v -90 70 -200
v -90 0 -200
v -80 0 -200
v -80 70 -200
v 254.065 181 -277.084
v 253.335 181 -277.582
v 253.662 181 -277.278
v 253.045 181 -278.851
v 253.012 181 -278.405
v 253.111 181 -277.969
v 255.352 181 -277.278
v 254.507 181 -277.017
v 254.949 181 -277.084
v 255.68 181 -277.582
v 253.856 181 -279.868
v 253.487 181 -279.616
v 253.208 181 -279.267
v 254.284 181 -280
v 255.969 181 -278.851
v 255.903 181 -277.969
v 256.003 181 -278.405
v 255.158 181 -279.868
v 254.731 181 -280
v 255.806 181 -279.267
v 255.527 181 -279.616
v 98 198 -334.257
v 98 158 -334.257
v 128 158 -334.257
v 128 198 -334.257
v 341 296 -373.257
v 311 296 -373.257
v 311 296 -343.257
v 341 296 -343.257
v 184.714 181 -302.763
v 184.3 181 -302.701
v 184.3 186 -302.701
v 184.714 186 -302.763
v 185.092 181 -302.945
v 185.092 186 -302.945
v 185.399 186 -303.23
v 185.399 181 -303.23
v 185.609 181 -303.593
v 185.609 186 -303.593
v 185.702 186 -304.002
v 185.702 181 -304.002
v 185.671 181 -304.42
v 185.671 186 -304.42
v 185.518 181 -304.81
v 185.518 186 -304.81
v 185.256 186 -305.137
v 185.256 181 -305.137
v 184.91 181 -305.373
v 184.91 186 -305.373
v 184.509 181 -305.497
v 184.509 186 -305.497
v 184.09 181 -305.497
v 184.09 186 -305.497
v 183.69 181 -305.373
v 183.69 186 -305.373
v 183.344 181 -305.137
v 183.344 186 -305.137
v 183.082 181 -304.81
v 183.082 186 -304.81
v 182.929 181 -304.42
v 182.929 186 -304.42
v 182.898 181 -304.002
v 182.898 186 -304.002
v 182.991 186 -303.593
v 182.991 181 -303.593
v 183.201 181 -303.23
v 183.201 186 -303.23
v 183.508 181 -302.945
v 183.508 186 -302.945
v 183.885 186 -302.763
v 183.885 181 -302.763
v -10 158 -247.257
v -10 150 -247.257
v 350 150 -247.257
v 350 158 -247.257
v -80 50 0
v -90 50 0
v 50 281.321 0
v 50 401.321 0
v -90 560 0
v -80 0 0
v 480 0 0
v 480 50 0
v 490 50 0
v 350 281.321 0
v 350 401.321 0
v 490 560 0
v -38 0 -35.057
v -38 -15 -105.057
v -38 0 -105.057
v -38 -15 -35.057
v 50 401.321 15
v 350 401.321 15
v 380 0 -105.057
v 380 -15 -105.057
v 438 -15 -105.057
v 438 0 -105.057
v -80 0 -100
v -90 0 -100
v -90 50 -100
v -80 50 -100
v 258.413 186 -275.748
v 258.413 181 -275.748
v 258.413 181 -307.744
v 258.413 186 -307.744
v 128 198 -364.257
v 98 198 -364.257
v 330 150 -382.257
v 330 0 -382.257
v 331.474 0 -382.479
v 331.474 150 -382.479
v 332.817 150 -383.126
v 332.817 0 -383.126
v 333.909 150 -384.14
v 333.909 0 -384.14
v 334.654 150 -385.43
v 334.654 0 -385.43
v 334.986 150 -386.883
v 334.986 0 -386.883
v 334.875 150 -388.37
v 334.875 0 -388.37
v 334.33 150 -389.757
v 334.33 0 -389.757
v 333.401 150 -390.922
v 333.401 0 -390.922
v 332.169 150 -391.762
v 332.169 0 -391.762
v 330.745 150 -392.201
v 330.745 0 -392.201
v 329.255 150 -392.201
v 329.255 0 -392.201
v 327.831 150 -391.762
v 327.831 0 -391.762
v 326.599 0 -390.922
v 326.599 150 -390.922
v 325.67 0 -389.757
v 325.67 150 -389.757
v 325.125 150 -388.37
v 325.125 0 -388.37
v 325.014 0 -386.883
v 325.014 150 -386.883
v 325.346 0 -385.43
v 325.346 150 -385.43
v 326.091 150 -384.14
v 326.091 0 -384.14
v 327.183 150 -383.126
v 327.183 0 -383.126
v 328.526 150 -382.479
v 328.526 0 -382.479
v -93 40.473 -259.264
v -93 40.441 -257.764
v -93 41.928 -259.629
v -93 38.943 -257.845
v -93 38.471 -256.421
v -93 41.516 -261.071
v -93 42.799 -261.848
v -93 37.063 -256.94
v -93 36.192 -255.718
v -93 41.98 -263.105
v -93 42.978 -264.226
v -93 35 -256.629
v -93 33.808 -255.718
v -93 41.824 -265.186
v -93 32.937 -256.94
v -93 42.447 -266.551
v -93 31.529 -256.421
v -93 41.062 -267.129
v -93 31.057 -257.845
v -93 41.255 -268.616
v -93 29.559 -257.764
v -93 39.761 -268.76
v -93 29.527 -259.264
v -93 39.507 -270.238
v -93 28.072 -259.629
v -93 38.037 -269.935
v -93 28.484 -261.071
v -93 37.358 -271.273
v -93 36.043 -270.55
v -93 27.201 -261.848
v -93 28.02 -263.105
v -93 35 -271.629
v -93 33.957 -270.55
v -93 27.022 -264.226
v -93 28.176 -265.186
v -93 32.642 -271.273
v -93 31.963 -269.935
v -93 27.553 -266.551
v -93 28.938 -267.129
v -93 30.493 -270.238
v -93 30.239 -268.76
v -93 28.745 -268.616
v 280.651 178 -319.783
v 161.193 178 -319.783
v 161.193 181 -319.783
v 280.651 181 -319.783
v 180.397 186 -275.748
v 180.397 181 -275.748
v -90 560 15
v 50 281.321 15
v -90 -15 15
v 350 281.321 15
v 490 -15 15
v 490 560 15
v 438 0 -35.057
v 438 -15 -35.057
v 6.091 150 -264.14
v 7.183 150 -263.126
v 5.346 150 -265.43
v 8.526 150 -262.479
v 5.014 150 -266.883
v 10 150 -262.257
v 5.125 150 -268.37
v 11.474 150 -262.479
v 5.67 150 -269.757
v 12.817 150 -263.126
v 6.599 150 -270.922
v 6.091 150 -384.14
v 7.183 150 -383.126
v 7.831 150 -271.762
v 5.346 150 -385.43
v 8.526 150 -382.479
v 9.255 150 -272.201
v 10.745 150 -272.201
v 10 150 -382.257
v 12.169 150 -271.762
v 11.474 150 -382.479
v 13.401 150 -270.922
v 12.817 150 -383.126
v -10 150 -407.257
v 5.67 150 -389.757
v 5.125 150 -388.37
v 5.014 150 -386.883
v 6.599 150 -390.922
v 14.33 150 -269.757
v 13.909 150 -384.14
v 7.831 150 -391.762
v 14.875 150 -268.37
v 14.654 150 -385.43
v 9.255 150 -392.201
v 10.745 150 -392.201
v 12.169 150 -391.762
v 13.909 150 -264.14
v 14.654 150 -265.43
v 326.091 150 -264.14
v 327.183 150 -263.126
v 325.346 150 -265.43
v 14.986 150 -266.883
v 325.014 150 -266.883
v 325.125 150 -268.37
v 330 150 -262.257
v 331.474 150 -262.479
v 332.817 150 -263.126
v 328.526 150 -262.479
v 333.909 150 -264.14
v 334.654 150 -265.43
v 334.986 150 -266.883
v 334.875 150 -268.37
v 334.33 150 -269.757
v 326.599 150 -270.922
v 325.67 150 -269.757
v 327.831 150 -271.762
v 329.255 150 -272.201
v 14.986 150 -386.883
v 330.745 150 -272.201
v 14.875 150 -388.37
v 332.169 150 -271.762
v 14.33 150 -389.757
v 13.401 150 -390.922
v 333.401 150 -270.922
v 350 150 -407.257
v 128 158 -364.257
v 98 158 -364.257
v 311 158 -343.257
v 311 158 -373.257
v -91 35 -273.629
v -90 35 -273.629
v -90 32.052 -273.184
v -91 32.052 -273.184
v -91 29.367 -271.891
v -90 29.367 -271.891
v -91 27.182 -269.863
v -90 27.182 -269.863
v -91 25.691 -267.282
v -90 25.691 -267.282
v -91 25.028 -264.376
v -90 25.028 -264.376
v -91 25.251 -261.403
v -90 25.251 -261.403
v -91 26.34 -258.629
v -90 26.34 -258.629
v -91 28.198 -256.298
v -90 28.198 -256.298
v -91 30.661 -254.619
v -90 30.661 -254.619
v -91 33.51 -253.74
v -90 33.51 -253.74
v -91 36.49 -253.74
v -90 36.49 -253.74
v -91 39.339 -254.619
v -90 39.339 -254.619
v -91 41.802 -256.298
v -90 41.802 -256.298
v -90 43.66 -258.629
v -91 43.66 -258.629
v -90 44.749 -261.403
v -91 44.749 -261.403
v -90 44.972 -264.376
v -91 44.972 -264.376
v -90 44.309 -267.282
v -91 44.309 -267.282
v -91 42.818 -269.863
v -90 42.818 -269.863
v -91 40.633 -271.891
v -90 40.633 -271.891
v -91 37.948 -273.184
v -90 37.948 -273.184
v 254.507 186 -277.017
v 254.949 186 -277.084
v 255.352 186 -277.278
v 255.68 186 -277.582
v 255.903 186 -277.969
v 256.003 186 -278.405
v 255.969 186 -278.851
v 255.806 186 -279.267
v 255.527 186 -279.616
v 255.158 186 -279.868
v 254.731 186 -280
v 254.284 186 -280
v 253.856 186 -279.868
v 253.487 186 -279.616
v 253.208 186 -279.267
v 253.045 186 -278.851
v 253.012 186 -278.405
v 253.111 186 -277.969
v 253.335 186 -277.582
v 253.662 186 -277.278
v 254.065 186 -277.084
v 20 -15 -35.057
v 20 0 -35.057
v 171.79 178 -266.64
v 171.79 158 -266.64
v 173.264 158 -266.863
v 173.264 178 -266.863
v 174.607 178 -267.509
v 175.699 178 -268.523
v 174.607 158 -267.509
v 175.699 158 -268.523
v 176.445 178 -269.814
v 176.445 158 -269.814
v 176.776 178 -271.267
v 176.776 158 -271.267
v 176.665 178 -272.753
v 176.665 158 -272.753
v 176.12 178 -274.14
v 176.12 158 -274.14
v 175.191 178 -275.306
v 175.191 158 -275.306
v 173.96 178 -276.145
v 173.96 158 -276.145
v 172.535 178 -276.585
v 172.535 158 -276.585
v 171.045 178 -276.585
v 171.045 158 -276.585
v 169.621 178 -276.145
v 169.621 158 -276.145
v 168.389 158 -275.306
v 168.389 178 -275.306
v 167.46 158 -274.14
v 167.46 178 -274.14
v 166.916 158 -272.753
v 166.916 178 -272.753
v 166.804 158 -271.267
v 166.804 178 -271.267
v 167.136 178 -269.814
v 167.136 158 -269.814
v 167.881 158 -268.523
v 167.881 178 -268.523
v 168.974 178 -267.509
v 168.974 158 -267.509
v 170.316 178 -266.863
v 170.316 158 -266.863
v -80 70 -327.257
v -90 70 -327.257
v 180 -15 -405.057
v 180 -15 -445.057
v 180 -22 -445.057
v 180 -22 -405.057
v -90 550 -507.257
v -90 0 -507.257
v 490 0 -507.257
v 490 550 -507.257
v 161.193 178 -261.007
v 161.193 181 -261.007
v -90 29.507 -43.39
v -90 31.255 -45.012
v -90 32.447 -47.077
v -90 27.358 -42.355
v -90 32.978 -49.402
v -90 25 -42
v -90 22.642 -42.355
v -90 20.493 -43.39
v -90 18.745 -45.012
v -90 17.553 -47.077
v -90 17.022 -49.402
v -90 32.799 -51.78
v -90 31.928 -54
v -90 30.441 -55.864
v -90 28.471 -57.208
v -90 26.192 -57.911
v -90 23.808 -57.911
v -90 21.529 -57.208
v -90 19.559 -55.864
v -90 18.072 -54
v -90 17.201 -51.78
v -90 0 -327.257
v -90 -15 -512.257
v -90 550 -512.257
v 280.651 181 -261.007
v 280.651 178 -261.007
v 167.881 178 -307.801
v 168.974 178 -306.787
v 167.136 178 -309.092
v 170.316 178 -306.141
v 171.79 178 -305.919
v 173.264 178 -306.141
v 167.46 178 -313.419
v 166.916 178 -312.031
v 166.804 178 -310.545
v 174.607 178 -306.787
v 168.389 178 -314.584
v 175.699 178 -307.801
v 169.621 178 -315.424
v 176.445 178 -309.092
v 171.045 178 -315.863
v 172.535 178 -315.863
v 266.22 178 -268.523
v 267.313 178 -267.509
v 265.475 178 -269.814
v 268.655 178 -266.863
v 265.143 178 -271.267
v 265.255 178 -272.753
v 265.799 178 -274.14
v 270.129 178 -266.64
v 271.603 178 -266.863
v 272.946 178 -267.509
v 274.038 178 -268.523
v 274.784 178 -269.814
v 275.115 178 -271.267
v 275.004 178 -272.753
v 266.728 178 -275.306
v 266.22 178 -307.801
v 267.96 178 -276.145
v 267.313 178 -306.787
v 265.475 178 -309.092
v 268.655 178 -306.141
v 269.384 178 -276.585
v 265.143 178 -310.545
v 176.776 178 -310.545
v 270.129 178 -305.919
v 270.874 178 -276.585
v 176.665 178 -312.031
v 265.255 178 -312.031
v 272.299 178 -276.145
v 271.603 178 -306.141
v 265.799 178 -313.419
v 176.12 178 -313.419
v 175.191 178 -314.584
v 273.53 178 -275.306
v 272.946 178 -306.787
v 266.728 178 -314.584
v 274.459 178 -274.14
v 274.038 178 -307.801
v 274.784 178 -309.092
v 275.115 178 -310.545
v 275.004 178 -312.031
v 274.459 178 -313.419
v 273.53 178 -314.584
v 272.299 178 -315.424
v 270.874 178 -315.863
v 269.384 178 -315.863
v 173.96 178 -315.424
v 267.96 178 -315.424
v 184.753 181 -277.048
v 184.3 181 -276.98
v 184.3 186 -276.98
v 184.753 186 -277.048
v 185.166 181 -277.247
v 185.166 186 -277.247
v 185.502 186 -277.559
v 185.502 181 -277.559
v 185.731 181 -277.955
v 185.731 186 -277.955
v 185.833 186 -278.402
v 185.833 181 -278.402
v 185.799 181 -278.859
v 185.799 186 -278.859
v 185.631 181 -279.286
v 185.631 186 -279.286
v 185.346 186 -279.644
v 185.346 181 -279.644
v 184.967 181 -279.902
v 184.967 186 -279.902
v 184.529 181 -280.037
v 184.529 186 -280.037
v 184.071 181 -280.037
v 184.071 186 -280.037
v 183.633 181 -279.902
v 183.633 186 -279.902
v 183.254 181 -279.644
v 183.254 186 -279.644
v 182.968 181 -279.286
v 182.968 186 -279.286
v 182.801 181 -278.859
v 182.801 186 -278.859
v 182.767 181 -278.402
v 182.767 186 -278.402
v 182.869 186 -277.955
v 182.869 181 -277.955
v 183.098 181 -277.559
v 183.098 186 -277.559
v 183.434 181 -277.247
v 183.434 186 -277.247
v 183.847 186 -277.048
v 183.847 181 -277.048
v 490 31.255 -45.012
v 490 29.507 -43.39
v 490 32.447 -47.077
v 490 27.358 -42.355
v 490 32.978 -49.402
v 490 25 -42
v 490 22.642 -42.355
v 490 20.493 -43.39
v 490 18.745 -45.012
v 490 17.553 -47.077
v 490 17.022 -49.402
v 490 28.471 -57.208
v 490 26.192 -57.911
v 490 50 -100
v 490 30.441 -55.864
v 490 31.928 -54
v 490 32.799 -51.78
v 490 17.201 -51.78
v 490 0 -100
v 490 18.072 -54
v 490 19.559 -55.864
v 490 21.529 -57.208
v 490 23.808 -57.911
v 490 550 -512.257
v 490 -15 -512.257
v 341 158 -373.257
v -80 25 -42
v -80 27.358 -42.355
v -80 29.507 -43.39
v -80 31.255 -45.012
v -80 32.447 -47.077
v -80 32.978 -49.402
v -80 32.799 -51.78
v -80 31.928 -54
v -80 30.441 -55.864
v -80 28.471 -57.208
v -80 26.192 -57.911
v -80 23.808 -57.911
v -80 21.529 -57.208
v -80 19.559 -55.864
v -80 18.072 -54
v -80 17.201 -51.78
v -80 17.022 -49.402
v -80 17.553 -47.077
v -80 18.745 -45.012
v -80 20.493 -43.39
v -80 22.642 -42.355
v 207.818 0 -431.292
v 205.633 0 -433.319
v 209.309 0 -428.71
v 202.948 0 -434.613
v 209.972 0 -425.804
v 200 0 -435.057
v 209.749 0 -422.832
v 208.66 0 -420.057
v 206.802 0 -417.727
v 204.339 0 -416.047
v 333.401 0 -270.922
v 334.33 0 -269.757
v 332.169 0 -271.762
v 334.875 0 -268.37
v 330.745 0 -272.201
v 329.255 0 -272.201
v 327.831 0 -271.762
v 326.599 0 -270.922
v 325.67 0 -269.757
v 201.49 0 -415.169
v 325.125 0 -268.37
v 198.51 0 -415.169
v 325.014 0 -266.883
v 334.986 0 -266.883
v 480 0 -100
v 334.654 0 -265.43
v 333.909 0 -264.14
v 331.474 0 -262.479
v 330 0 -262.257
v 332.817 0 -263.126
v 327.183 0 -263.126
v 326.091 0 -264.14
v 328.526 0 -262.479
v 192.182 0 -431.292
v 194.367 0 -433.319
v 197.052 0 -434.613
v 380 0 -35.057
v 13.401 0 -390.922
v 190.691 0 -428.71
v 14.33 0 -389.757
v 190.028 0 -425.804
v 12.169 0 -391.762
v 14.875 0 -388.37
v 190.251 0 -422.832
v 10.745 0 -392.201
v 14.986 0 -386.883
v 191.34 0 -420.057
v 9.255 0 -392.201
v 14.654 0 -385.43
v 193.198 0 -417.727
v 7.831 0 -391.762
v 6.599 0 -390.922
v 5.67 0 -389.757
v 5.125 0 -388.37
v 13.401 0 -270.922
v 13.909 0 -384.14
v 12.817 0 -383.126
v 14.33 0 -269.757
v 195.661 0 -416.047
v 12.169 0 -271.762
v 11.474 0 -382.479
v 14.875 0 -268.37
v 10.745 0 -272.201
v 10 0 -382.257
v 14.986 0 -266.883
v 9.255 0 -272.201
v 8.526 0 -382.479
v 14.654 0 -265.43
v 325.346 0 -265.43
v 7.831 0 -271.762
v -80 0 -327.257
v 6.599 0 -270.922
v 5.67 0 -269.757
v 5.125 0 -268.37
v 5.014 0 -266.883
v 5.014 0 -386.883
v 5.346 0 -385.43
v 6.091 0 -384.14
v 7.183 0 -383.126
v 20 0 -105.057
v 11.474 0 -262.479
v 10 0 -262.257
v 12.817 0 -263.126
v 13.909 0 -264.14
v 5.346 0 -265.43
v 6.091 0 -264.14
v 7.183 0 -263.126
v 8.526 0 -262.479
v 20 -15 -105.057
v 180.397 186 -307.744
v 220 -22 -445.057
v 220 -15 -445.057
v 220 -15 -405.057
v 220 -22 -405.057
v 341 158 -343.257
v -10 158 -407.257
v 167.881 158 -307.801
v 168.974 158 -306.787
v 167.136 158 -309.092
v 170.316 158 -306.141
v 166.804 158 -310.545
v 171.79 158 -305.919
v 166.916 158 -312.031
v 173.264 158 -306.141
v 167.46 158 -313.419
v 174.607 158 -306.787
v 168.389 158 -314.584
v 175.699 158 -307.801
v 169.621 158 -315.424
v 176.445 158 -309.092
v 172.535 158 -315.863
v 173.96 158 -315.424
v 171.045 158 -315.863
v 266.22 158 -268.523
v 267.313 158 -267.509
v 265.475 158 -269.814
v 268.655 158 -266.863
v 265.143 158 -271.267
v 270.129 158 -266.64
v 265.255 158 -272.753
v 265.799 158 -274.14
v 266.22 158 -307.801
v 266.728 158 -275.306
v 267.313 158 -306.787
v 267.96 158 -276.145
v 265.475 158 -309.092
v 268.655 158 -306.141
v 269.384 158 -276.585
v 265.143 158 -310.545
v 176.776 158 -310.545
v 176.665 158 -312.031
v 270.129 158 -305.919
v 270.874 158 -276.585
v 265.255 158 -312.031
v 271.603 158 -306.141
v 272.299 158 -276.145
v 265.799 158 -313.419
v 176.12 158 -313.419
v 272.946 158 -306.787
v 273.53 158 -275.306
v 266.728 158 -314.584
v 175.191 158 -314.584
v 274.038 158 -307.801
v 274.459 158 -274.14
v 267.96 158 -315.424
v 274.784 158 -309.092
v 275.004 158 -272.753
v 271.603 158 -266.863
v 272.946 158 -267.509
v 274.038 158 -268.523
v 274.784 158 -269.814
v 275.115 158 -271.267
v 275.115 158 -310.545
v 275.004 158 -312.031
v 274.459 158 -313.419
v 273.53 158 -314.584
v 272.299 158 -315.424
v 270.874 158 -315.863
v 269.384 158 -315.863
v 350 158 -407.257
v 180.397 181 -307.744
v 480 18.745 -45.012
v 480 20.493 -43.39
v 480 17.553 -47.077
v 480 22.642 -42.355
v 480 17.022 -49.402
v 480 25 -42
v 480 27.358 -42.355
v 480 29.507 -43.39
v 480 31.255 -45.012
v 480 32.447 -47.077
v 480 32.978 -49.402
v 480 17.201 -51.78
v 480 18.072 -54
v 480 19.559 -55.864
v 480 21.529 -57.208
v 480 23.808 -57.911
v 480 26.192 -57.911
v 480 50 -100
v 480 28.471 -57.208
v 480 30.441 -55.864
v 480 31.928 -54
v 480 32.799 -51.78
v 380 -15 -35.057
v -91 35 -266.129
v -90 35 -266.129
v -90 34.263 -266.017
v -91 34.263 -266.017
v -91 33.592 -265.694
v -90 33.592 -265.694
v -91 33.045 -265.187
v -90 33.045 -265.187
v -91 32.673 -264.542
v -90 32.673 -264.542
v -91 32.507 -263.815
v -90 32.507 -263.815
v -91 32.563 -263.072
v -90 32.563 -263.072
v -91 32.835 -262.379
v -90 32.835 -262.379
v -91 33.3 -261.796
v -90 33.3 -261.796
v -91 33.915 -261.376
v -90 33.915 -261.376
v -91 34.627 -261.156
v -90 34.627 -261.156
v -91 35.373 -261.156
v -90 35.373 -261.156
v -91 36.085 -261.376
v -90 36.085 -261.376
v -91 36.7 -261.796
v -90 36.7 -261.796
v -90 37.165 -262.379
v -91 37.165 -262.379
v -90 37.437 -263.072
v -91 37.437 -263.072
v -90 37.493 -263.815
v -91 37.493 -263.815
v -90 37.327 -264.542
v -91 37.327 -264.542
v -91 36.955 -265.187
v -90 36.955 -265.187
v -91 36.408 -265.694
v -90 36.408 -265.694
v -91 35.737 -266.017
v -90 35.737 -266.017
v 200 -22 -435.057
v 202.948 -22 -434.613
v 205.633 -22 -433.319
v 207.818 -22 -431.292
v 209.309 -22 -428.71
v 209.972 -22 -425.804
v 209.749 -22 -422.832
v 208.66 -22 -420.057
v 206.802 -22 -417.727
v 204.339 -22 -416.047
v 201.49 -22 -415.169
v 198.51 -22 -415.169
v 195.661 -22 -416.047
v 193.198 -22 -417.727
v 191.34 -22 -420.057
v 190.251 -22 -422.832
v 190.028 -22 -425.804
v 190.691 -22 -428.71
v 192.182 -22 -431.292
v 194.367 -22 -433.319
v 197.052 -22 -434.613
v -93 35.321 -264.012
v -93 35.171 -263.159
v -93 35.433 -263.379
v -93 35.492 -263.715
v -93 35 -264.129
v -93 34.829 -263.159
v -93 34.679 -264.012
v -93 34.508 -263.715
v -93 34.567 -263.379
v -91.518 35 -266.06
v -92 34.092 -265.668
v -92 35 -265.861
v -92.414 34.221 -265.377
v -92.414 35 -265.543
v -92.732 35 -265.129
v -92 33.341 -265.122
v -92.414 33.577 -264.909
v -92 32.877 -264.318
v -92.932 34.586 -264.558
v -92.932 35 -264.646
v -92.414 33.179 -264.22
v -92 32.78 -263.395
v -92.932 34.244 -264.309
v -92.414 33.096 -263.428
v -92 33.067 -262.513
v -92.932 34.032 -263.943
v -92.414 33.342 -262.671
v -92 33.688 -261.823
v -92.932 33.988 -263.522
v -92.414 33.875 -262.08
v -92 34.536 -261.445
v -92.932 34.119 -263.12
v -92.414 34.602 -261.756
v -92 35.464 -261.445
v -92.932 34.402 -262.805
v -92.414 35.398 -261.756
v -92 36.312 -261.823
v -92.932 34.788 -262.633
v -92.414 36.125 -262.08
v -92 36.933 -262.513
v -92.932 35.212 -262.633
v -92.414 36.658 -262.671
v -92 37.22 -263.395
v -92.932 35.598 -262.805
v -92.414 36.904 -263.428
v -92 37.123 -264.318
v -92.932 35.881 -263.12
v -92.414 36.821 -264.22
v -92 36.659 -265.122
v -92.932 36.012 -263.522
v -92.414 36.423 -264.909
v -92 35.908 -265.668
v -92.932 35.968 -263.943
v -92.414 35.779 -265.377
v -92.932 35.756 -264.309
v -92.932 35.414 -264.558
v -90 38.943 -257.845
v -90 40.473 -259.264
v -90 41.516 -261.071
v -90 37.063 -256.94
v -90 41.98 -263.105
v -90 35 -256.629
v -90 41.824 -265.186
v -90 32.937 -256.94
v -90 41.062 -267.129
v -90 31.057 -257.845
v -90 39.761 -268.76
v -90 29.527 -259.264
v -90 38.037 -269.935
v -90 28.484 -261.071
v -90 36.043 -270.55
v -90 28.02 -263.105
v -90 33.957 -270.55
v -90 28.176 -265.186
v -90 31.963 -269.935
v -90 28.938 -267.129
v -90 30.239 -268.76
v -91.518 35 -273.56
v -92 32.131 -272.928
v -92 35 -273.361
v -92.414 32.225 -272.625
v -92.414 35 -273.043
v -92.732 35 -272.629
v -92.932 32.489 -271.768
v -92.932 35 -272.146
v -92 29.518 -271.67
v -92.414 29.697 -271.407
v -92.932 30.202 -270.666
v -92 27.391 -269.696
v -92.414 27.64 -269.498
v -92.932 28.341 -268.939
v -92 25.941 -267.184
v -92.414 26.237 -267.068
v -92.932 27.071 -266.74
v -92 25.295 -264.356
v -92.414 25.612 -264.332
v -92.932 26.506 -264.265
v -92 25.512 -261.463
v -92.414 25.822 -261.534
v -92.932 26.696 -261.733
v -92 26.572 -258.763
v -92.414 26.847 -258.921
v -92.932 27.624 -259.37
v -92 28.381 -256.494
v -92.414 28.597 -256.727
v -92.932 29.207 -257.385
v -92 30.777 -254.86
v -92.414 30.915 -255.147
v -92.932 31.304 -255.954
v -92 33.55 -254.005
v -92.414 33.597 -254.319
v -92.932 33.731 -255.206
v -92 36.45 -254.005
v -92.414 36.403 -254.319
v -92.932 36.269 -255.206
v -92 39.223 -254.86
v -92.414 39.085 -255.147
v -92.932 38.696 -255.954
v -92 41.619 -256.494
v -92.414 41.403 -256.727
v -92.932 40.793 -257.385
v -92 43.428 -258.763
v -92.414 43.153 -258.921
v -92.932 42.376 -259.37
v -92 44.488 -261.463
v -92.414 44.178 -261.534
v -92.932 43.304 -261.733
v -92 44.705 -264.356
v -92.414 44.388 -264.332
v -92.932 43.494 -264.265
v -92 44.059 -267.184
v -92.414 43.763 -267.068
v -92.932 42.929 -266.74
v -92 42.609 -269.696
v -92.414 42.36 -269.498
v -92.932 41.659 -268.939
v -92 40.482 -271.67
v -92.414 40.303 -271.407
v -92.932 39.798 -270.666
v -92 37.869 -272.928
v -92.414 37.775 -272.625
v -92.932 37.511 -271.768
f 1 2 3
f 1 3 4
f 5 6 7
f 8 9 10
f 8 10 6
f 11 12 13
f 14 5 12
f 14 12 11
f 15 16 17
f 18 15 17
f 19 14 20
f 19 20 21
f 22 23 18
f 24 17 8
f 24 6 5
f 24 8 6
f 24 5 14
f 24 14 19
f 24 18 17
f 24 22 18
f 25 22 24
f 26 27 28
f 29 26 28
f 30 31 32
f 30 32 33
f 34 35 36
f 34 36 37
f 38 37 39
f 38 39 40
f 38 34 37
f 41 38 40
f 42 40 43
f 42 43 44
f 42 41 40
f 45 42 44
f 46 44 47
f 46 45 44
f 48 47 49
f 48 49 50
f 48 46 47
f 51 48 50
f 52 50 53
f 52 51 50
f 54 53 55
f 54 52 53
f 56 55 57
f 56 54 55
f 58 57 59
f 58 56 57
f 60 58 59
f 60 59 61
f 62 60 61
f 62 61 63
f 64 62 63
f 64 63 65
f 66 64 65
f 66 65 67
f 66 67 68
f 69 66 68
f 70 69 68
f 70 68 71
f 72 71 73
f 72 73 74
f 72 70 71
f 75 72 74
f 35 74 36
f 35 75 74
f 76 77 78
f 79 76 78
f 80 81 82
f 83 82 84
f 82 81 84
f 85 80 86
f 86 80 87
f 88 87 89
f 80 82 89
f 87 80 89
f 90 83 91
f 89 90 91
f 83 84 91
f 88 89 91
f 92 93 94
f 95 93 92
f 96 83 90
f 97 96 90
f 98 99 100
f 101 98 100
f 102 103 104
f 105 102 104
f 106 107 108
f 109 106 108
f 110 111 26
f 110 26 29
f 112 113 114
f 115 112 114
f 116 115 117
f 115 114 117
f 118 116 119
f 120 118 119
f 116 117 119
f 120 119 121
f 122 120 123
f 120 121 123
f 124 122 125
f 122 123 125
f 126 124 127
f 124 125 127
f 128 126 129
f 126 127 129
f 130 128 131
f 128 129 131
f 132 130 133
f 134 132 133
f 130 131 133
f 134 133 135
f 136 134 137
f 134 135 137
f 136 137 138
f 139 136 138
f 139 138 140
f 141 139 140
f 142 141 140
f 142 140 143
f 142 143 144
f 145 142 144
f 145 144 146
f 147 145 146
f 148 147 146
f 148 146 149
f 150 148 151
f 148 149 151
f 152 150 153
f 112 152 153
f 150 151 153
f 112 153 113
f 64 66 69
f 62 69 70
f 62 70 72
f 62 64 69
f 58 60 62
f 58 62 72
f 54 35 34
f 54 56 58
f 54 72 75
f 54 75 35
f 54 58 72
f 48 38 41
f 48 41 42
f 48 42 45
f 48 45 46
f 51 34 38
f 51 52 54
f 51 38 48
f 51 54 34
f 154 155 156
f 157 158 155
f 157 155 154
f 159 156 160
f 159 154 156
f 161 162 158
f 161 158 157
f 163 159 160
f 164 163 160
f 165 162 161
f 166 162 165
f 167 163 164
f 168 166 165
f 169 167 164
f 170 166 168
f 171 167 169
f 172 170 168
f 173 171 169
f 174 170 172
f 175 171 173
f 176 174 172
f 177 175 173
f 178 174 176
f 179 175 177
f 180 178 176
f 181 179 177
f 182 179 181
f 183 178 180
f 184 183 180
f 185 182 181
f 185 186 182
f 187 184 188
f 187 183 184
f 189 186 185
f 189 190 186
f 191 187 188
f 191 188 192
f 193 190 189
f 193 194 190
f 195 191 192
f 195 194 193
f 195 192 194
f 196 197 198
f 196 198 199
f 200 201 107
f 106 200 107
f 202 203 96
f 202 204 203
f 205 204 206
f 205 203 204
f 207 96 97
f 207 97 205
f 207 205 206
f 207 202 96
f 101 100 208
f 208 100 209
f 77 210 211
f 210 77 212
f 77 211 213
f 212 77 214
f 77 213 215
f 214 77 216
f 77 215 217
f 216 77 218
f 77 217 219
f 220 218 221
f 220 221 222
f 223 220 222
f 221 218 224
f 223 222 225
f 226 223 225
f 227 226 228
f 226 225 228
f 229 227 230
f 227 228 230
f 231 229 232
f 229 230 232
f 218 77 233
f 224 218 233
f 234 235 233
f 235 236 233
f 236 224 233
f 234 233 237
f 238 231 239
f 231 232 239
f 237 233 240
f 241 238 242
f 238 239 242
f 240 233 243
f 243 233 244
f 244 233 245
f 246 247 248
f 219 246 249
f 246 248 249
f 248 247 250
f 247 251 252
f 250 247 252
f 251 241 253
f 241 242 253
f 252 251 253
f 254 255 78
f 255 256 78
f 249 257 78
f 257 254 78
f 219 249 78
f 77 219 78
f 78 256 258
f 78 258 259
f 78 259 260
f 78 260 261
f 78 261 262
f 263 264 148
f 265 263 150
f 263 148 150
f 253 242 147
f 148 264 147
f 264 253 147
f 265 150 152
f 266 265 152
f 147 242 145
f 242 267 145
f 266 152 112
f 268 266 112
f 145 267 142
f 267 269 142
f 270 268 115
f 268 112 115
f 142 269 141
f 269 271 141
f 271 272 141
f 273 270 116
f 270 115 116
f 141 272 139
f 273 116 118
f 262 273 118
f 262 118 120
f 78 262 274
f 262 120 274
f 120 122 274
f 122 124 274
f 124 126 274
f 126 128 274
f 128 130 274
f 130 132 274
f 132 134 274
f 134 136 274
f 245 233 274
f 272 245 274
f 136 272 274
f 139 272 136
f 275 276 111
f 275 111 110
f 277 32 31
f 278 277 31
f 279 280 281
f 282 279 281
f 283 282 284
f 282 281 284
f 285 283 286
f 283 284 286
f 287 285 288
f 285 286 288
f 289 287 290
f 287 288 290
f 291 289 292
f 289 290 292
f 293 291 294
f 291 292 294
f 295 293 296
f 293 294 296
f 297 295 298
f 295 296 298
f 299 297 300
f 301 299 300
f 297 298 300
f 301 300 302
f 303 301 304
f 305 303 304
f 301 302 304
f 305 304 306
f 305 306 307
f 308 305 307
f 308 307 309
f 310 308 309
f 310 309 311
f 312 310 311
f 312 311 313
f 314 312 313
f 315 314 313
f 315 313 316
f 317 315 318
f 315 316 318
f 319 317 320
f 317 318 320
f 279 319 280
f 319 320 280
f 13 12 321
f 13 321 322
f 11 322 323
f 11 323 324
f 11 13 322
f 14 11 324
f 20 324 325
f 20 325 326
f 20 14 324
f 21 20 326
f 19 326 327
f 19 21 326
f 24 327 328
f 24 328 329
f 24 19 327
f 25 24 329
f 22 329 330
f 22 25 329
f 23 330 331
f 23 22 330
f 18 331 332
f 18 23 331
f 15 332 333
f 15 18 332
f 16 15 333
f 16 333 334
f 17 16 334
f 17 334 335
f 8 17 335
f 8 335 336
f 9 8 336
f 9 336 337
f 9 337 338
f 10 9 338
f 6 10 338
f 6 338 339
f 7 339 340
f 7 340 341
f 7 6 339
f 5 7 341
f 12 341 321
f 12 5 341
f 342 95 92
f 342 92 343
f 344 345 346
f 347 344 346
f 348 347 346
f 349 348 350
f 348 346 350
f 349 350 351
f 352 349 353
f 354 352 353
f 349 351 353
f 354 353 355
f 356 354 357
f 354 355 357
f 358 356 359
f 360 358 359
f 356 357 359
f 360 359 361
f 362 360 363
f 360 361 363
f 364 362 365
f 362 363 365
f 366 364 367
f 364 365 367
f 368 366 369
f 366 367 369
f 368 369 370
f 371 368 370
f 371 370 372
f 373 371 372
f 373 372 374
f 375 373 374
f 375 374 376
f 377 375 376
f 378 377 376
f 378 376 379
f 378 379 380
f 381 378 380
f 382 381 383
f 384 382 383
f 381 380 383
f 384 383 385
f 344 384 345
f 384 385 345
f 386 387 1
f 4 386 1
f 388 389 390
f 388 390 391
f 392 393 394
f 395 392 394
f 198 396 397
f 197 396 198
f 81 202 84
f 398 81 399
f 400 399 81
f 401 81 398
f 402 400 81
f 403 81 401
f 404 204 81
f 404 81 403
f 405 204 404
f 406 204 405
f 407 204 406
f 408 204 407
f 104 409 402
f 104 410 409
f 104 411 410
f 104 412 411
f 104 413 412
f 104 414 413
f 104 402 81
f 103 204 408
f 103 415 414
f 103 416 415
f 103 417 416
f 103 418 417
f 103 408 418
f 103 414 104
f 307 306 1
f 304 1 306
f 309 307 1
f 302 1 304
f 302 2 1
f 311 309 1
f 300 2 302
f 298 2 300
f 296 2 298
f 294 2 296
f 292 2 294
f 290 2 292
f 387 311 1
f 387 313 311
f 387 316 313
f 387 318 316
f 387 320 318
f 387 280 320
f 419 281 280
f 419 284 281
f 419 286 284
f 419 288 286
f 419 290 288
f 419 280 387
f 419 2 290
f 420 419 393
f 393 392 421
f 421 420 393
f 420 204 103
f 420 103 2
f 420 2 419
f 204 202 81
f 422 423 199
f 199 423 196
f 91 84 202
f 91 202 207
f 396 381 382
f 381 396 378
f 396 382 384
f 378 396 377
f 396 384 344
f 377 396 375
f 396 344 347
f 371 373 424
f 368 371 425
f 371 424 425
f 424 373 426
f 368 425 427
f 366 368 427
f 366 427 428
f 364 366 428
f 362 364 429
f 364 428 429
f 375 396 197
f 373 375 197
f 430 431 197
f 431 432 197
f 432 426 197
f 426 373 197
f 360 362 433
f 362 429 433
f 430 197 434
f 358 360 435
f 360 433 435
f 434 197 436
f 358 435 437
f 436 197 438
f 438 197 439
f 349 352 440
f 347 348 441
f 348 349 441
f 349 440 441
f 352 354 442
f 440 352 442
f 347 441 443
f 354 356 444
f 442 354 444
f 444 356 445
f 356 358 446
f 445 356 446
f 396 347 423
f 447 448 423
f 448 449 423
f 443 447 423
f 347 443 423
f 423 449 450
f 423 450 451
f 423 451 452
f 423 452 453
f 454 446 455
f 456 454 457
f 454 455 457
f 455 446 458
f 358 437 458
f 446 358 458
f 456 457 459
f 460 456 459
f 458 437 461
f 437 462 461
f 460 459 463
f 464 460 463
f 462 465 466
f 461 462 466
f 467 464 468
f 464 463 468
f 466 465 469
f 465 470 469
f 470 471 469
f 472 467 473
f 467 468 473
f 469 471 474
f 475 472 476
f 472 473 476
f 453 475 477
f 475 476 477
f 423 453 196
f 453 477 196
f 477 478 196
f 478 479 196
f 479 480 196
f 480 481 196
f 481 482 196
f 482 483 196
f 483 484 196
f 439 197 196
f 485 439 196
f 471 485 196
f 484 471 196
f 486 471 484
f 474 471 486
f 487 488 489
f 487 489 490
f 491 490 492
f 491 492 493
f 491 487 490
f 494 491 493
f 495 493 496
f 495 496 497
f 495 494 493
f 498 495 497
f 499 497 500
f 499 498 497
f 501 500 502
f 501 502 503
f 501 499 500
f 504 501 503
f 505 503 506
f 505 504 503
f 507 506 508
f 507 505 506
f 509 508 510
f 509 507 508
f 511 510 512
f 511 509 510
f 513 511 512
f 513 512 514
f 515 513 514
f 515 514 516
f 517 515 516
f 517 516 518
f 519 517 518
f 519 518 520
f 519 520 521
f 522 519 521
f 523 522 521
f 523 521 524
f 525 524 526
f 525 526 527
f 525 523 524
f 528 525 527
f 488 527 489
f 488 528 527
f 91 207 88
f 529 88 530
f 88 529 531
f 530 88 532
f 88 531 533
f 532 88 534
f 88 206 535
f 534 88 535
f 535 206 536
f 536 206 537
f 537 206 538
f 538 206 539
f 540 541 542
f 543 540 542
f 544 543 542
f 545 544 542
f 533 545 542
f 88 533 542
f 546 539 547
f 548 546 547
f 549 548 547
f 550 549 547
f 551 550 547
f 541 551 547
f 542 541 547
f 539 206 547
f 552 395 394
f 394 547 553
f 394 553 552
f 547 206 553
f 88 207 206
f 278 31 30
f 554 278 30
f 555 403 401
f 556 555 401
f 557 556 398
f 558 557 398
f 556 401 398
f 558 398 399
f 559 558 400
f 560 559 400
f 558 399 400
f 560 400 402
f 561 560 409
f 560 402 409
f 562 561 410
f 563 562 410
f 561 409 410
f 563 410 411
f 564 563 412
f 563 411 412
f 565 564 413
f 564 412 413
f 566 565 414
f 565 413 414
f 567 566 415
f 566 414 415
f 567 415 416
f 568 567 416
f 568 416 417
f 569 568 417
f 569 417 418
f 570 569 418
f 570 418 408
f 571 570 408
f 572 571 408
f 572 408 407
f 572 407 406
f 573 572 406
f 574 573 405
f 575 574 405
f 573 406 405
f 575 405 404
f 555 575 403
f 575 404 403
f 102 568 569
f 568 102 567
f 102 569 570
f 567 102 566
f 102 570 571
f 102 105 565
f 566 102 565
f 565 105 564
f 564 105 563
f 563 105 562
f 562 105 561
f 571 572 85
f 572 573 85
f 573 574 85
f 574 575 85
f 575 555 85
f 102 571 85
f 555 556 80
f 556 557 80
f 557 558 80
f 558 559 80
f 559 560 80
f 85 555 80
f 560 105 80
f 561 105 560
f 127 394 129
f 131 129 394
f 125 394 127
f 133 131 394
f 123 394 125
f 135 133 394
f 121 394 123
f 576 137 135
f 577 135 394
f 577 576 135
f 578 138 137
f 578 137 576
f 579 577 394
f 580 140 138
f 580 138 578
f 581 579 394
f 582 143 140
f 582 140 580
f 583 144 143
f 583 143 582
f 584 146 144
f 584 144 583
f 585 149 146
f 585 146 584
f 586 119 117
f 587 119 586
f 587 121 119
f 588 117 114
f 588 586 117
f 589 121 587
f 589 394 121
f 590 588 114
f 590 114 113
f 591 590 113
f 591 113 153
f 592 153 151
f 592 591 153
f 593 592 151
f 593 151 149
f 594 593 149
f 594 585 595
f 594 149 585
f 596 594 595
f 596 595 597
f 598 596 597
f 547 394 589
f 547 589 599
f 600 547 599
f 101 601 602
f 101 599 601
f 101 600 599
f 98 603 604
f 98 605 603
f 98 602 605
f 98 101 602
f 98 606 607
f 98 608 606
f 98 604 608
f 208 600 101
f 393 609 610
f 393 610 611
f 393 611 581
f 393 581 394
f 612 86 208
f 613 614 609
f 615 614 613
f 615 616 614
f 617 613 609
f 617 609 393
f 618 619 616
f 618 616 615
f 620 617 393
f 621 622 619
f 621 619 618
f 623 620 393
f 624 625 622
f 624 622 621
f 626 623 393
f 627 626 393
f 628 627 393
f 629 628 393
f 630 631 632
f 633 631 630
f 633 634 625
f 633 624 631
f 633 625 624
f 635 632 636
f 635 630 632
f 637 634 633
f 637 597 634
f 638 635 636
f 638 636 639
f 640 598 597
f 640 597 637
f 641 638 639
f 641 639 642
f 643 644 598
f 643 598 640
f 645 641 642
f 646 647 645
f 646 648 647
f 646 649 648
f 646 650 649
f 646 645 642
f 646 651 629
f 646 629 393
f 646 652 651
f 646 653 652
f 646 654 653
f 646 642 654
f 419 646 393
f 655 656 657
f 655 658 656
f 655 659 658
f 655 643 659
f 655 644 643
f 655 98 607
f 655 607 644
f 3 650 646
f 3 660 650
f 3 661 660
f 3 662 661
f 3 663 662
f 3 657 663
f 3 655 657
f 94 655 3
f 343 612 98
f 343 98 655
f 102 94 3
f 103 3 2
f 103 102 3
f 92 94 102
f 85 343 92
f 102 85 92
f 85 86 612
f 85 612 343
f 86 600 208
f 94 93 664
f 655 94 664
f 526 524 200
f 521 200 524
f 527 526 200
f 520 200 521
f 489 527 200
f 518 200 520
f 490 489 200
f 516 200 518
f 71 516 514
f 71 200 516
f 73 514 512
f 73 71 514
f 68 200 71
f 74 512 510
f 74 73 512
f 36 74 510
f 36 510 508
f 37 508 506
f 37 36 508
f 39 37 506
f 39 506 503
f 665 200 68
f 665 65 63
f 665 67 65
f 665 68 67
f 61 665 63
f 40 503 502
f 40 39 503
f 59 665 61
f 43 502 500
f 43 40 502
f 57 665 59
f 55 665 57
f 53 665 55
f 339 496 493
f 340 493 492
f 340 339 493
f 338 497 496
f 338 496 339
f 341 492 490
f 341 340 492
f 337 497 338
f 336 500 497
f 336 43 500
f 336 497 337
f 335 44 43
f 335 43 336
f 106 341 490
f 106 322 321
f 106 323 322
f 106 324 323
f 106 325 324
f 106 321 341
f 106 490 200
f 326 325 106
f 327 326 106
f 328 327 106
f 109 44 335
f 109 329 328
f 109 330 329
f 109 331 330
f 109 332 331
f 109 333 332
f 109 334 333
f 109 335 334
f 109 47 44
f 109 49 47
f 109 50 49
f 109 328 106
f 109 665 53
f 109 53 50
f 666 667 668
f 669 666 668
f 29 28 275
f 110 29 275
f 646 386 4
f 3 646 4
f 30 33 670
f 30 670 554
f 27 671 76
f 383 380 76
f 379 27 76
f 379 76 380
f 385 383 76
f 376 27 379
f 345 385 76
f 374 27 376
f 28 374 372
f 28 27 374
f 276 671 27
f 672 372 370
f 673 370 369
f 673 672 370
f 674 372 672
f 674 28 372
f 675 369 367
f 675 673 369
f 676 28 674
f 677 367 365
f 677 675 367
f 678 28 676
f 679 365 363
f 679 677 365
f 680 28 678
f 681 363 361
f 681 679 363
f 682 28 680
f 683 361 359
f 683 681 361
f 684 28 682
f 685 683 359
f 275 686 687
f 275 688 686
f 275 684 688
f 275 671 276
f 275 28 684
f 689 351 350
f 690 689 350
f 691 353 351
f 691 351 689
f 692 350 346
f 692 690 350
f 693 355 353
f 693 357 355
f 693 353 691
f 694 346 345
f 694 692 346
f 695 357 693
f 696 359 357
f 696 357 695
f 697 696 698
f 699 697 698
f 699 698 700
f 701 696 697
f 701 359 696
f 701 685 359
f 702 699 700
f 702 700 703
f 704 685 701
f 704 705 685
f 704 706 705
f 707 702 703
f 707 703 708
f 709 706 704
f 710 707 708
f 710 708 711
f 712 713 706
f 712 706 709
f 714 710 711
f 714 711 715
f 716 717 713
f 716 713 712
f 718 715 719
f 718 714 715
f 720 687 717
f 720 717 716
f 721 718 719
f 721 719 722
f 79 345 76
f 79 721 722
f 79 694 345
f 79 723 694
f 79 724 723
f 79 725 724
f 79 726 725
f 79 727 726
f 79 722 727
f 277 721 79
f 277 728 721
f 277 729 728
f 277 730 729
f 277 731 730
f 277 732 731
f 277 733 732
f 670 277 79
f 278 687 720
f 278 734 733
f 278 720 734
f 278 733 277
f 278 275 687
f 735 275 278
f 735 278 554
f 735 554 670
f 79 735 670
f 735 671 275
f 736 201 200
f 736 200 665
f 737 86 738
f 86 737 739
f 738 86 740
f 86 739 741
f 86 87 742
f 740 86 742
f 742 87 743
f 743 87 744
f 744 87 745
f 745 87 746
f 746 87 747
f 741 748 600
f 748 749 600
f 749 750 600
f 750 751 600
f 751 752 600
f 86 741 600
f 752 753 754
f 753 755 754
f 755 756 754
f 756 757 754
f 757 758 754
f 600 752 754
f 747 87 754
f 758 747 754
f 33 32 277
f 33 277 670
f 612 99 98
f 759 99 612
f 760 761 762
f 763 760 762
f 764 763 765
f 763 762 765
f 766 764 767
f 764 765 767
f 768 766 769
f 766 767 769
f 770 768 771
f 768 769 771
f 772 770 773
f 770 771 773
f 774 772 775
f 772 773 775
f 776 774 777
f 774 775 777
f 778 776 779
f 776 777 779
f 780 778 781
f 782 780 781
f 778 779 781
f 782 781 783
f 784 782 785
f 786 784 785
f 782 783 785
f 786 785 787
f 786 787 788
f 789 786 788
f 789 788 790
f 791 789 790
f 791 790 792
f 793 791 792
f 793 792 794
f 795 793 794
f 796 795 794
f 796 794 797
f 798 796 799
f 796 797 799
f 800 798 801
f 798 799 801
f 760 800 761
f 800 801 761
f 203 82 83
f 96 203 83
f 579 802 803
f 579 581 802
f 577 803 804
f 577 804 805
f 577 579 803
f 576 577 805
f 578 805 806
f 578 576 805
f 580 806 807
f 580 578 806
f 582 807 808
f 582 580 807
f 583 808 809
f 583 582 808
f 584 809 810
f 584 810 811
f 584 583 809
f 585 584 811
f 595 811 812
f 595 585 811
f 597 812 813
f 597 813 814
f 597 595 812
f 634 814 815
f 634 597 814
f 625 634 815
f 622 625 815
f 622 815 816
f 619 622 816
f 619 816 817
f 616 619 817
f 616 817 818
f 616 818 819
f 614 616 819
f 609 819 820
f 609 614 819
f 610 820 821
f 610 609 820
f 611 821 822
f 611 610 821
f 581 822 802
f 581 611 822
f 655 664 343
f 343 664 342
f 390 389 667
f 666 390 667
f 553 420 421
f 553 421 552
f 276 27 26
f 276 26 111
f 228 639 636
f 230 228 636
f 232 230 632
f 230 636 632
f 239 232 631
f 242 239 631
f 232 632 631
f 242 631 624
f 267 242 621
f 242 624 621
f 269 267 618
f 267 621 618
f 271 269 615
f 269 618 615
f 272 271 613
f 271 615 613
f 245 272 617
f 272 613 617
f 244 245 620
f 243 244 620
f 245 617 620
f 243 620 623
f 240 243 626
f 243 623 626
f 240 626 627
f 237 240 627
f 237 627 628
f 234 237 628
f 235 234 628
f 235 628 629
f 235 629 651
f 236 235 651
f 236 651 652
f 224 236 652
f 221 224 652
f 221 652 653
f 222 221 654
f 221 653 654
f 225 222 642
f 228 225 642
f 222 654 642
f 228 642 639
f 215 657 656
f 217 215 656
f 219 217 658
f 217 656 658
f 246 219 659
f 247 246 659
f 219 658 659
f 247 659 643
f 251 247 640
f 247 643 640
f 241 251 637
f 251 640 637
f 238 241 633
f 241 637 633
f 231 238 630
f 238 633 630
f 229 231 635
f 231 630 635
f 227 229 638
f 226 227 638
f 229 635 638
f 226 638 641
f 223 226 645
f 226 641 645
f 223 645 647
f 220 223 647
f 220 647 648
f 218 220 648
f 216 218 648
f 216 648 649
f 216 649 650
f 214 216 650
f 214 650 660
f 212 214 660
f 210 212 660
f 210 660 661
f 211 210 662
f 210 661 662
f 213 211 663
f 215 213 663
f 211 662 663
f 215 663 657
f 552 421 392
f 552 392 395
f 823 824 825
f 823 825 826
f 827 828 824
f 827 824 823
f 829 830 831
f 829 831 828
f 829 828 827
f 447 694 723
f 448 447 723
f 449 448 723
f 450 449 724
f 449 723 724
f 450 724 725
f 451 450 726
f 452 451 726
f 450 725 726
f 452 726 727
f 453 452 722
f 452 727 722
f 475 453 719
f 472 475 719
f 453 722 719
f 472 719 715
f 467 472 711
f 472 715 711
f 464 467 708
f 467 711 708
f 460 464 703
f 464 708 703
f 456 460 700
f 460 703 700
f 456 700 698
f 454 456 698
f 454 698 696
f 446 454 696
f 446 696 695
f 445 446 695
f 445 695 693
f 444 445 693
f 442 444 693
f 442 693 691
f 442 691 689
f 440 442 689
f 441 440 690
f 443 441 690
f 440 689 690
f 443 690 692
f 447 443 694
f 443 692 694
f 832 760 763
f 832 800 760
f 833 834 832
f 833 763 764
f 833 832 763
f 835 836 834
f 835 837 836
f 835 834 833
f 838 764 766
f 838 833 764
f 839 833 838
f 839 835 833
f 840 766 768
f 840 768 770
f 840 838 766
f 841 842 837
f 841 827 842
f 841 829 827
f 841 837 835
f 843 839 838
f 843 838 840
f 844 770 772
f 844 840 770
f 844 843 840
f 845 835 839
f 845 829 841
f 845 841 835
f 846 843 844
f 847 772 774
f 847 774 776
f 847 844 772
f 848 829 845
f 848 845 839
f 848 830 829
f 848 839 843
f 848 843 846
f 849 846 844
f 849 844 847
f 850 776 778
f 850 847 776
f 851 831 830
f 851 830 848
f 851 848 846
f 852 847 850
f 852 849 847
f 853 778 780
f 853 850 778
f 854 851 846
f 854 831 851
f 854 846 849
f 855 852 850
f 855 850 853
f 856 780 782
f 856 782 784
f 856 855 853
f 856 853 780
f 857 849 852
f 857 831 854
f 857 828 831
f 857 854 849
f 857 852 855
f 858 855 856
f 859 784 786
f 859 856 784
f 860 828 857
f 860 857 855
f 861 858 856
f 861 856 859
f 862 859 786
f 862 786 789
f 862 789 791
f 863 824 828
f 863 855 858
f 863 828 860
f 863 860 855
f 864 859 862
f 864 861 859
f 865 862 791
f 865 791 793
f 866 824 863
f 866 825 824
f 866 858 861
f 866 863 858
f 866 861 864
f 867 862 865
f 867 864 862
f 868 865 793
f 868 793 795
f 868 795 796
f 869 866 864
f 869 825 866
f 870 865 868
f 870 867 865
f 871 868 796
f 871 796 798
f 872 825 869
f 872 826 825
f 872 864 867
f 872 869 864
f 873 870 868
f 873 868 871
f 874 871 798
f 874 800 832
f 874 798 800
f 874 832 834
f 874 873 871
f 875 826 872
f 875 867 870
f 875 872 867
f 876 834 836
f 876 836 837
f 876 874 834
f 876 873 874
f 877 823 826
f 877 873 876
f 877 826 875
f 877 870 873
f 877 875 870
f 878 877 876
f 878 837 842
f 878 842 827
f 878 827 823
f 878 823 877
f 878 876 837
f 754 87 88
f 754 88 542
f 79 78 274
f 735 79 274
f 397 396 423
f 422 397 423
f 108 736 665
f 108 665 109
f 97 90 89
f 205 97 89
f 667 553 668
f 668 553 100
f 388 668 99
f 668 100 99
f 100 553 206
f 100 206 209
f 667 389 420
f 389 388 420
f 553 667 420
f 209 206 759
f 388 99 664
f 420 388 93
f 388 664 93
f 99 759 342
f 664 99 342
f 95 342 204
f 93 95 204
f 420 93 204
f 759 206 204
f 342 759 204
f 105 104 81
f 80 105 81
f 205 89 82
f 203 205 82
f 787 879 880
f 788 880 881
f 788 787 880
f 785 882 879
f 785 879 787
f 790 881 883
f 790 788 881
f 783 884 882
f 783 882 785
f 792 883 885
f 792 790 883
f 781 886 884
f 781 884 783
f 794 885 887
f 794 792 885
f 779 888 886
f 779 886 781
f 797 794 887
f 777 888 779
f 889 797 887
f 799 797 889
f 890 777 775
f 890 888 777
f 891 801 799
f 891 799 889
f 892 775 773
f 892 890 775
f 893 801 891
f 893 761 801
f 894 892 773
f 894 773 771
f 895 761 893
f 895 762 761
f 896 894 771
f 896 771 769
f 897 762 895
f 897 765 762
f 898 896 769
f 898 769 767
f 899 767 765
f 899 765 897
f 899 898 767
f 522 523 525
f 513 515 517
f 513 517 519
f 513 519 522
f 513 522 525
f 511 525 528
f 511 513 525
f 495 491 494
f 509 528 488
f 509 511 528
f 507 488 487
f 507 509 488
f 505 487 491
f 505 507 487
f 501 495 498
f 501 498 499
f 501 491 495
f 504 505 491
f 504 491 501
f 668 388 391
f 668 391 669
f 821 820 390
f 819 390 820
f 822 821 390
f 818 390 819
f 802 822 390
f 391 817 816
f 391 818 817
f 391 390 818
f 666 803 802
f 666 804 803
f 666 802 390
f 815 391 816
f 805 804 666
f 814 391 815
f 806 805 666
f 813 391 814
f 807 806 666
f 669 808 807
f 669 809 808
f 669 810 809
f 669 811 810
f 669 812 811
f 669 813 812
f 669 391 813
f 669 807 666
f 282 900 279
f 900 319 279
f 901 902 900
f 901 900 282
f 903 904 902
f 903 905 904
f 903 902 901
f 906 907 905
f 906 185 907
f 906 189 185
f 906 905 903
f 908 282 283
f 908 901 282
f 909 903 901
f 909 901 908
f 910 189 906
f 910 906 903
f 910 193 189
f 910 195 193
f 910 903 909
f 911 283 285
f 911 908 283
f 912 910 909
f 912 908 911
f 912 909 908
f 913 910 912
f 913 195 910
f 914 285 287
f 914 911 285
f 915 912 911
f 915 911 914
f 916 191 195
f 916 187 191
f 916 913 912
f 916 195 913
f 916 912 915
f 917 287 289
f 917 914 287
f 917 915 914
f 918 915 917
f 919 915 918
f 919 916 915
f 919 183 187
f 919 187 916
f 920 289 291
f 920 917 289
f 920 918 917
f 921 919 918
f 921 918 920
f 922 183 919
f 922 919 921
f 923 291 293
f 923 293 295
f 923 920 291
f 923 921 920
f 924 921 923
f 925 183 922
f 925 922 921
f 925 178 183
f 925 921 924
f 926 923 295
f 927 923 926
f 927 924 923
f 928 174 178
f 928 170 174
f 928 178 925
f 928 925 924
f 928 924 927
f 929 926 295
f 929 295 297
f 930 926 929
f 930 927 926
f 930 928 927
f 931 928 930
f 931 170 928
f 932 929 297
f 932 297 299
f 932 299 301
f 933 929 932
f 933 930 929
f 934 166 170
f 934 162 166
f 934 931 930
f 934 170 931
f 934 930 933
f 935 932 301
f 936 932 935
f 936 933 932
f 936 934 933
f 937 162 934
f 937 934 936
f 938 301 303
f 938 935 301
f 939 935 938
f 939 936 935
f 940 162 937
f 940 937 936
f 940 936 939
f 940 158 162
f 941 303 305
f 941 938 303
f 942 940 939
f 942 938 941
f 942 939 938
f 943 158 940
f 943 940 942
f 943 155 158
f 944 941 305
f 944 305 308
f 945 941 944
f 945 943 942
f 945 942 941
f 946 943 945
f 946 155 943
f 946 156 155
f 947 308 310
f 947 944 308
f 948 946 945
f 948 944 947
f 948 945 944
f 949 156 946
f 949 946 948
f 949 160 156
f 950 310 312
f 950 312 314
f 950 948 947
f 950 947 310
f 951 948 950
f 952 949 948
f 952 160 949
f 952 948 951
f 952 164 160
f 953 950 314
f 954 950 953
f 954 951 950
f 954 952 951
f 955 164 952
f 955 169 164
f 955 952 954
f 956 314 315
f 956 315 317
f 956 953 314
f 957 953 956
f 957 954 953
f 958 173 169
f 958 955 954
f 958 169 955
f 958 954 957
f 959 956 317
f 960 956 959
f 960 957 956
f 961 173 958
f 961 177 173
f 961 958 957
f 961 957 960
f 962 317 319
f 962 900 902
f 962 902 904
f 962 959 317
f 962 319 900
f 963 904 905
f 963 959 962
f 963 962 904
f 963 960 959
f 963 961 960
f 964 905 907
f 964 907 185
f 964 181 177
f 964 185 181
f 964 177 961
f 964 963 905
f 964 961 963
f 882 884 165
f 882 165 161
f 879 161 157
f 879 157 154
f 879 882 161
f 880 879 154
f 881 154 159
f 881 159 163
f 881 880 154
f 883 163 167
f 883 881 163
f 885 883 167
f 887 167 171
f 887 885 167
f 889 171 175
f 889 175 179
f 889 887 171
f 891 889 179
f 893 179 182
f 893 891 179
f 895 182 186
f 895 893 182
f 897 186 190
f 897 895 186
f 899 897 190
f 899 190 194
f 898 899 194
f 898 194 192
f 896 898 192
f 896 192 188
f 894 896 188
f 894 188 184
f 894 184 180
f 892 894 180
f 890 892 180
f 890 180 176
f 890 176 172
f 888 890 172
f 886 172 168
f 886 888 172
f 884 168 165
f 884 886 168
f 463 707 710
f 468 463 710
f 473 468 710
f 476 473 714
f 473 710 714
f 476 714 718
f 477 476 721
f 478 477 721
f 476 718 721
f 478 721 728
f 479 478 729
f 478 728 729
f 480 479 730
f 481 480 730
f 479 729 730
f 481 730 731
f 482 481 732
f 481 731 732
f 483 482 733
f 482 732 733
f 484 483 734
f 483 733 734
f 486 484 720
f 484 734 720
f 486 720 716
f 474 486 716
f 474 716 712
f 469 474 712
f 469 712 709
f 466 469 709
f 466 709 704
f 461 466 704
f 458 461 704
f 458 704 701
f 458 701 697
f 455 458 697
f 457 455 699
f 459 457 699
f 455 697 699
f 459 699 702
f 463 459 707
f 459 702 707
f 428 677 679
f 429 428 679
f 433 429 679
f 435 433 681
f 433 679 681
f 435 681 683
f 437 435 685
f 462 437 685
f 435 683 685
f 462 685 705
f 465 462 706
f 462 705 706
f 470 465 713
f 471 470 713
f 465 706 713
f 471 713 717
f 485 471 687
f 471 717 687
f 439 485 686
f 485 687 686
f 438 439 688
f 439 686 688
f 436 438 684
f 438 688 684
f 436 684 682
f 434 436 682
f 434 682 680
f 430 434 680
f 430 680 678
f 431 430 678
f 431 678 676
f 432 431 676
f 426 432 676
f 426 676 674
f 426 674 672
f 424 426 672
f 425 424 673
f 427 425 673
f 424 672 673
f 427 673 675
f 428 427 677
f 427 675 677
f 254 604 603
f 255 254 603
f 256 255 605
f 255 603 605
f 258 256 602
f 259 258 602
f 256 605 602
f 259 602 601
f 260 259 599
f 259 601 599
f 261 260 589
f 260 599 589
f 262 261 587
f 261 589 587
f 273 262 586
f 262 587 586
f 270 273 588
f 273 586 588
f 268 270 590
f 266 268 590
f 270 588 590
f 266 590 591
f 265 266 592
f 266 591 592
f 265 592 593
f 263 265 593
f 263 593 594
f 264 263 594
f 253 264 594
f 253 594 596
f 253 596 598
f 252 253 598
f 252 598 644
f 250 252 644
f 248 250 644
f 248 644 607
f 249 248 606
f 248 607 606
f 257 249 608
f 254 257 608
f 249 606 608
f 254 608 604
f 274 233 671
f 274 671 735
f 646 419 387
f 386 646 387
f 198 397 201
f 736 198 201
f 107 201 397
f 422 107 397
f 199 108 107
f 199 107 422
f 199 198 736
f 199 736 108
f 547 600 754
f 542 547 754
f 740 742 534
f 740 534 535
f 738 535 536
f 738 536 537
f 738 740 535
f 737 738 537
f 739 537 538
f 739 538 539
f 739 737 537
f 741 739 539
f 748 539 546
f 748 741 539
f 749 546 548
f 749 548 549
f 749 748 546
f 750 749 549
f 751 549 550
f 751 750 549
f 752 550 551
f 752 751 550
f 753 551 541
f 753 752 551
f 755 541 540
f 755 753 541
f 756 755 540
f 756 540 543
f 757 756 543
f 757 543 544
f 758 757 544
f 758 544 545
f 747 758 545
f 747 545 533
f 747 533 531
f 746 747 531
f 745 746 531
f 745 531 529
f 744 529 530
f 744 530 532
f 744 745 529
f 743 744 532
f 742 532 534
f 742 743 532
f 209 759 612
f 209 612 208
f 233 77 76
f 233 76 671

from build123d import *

# Parameters (mm, degrees)
SKETCH_1_W          = 580
SKETCH_1_H          = 560
EXTRUDE_1_DEPTH     = 15
SKETCH_3_W          = 580
SKETCH_3_H          = 500.057079529
EXTRUDE_2_DEPTH     = 15
SKETCH_4_R          = 10
SKETCH_4_W          = 58
SKETCH_4_H          = 70
CUT_EXTRUDE_1_DEPTH = 15
SKETCH_5_W          = 40
SKETCH_5_H          = 40
SKETCH_5_R          = 10
EXTRUDE_3_DEPTH     = 7
SKETCH_6_W          = 100
SKETCH_6_H          = 50
SKETCH_6_R          = 8
EXTRUDE_4_DEPTH     = 10
EXTRUDE_START       = -10
SKETCH_7_W          = 100
SKETCH_7_H          = 50
SKETCH_7_R          = 8
EXTRUDE_5_DEPTH     = 10
SKETCH_8_W          = 580
SKETCH_8_H          = 15
EXTRUDE_6_DEPTH     = 27.2
SKETCH_9_W          = 580
SKETCH_9_H          = 5
EXTRUDE_7_DEPTH     = 550
SKETCH_10_R         = 5
EXTRUDE_8_DEPTH     = 150
SKETCH_11_W         = 360
SKETCH_11_H         = 160
EXTRUDE_9_DEPTH     = 8
SKETCH_12_W         = 30
SKETCH_12_H         = 30
EXTRUDE_10_DEPTH    = 40
SKETCH_13_W         = 30
SKETCH_13_H         = 30
EXTRUDE_11_DEPTH    = 138
SKETCH_14_W         = 127.257079529
SKETCH_14_H         = 70
EXTRUDE_12_DEPTH    = 10
SKETCH_15_R         = 10
SKETCH_15_R_2       = 7
SKETCH_15_R_3       = 2.5
EXTRUDE_13_DEPTH    = 3
FILLET_2_R          = 2
SKETCH_16_R         = 5
EXTRUDE_14_DEPTH    = 20
SKETCH_17_W         = 119.457499099
SKETCH_17_H         = 58.776896967
EXTRUDE_15_DEPTH    = 3
SKETCH_18_W         = 78.016217291
SKETCH_18_H         = 31.996524559
SKETCH_18_R         = 1.406019753
SKETCH_18_R_2       = 1.53736257
SKETCH_18_R_3       = 1.499754403
EXTRUDE_16_DEPTH    = 5


with BuildPart() as part:
    # 草图1 → 凸台-拉伸1 (new body)
    with BuildSketch(Plane.XY):
        with Locations((200, 280)):
            Rectangle(SKETCH_1_W, SKETCH_1_H)
        Polygon((200, 401.320557861), (350, 401.320557861), (350, 281.320557861), (50, 281.320557861), (50, 401.320557861), align=None, mode=Mode.SUBTRACT)
    extrude(amount=EXTRUDE_1_DEPTH)



with BuildPart() as body_2:
    # 草图3 → 凸台-拉伸2 (new body)
    with BuildSketch(Plane.XZ):
        with Locations((200, -235.028539765)):
            Rectangle(SKETCH_3_W, SKETCH_3_H)
    extrude(amount=EXTRUDE_2_DEPTH)

    # 草图4 → 切除-拉伸1 (cut)
    with BuildSketch(Plane.XZ.offset(15)):
        with Locations(Location((200, -425.057079529, 0), (0, 0, 270))):
            Circle(SKETCH_4_R)
        with Locations((409, -70.057079529)):
            Rectangle(SKETCH_4_W, SKETCH_4_H)
        with Locations((-9, -70.057079529)):
            Rectangle(SKETCH_4_W, SKETCH_4_H)
    extrude(amount=-CUT_EXTRUDE_1_DEPTH, mode=Mode.SUBTRACT)

    # 草图5 → 凸台-拉伸3 (add)
    with BuildSketch(Plane.XZ.offset(15)):
        with Locations((200, -425.057079529)):
            Rectangle(SKETCH_5_W, SKETCH_5_H)
        with Locations(Location((200, -425.057079529, 0), (0, 0, 270))):
            Circle(SKETCH_5_R, mode=Mode.SUBTRACT)
    extrude(amount=EXTRUDE_3_DEPTH)


with BuildPart() as part_1:
    add(part.part)

    add(body_2.part)  # 凸台-拉伸4 merges body 2
    # 草图6 → 凸台-拉伸4 (add)
    with BuildSketch(Plane.ZY.offset(90)):
        with Locations((-50, 25)):
            Rectangle(SKETCH_6_W, SKETCH_6_H)
        with Locations((-50, 25)):
            Circle(SKETCH_6_R, mode=Mode.SUBTRACT)
    extrude(amount=-EXTRUDE_4_DEPTH)

    # 草图7 → 凸台-拉伸5 (add)
    with BuildSketch(Plane(origin=(490, 0, 0), x_dir=(0, 0, -1), z_dir=(1, 0, 0)).offset(EXTRUDE_START)):
        with Locations((50, 25)):
            Rectangle(SKETCH_7_W, SKETCH_7_H)
        with Locations(Location((50, 25, 0), (0, 0, 180))):
            Circle(SKETCH_7_R, mode=Mode.SUBTRACT)
    extrude(amount=EXTRUDE_5_DEPTH)

    # 草图8 → 凸台-拉伸6 (add)
    with BuildSketch(Plane(origin=(0, 0, -485.057079529), x_dir=(-1, 0, 0), z_dir=(0, 0, -1))):
        with Locations((-200, -7.5)):
            Rectangle(SKETCH_8_W, SKETCH_8_H)
    extrude(amount=EXTRUDE_6_DEPTH)

    # 草图9 → 凸台-拉伸7 (add)
    with BuildSketch(Plane(origin=(0, 0, 0), x_dir=(1, 0, 0), z_dir=(0, 1, 0))):
        with Locations((200, 509.757079529)):
            Rectangle(SKETCH_9_W, SKETCH_9_H)
    extrude(amount=EXTRUDE_7_DEPTH)

    # 草图10 → 凸台-拉伸8 (add)
    with BuildSketch(Plane(origin=(0, 0, 0), x_dir=(1, 0, 0), z_dir=(0, 1, 0))):
        with Locations(Location((10, 387.257079529, 0), (0, 0, 270))):
            Circle(SKETCH_10_R)
        with Locations(Location((330, 387.257079529, 0), (0, 0, 270))):
            Circle(SKETCH_10_R)
        with Locations(Location((10, 267.257079529, 0), (0, 0, 270))):
            Circle(SKETCH_10_R)
        with Locations(Location((330, 267.257079529, 0), (0, 0, 270))):
            Circle(SKETCH_10_R)
    extrude(amount=EXTRUDE_8_DEPTH)

    # 草图11 → 凸台-拉伸9 (add)
    with BuildSketch(Plane(origin=(0, 150, 0), x_dir=(1, 0, 0), z_dir=(0, 1, 0))):
        with Locations((170, 327.257079529)):
            Rectangle(SKETCH_11_W, SKETCH_11_H)
    extrude(amount=EXTRUDE_9_DEPTH)

    # 草图12 → 凸台-拉伸10 (add)
    with BuildSketch(Plane(origin=(0, 158, 0), x_dir=(1, 0, 0), z_dir=(0, 1, 0))):
        with Locations((113, 349.257079529)):
            Rectangle(SKETCH_12_W, SKETCH_12_H)
    extrude(amount=EXTRUDE_10_DEPTH)

    # 草图13 → 凸台-拉伸11 (add)
    with BuildSketch(Plane(origin=(0, 158, 0), x_dir=(1, 0, 0), z_dir=(0, 1, 0))):
        with Locations((326, 358.257079529)):
            Rectangle(SKETCH_13_W, SKETCH_13_H)
    extrude(amount=EXTRUDE_11_DEPTH)

    # 草图14 → 凸台-拉伸12 (add)
    with BuildSketch(Plane.ZY.offset(90)):
        with Locations((-263.628539765, 35)):
            Rectangle(SKETCH_14_W, SKETCH_14_H)
    extrude(amount=-EXTRUDE_12_DEPTH)

    # 草图15 → 凸台-拉伸13 (add)
    # profile 1 of 2: a face of its own
    with BuildSketch(Plane.ZY.offset(90)):
        with Locations(Location((-263.628539764, 35, 0), (0, 0, 180))):
            Circle(SKETCH_15_R)
        with Locations((-263.628539764, 35)):
            Circle(SKETCH_15_R_2, mode=Mode.SUBTRACT)
    # profile 2 of 2: a face of its own
    with BuildSketch(Plane.ZY.offset(90)):
        with Locations(Location((-263.628539764, 35, 0), (0, 0, 180))):
            Circle(SKETCH_15_R_3)
    extrude(amount=EXTRUDE_13_DEPTH)

    # 圆角2
    fillet_2_edges = [part_1.edges().sort_by_distance(p)[0] for p in [
        (-93, 35, -253.628539764),
        (-93, 35, -261.128539764),
    ]]
    fillet(fillet_2_edges, radius=FILLET_2_R)

    # 草图16 → 凸台-拉伸14 (add)
    with BuildSketch(Plane(origin=(0, 158, 0), x_dir=(1, 0, 0), z_dir=(0, 1, 0))):
        with Locations(Location((171.790204926, 271.64043121, 0), (0, 0, 270))):
            Circle(SKETCH_16_R)
        with Locations(Location((270.129191609, 271.64043121, 0), (0, 0, 270))):
            Circle(SKETCH_16_R)
        with Locations(Location((171.790204926, 310.918685367, 0), (0, 0, 270))):
            Circle(SKETCH_16_R)
        with Locations(Location((270.129191609, 310.918685367, 0), (0, 0, 270))):
            Circle(SKETCH_16_R)
    extrude(amount=EXTRUDE_14_DEPTH)

    # 草图17 → 凸台-拉伸15 (add)
    with BuildSketch(Plane(origin=(0, 178, 0), x_dir=(1, 0, 0), z_dir=(0, 1, 0))):
        with Locations((220.921909881, 290.395031068)):
            Rectangle(SKETCH_17_W, SKETCH_17_H)
    extrude(amount=EXTRUDE_15_DEPTH)

    # 草图18 → 凸台-拉伸16 (add)
    with BuildSketch(Plane(origin=(0, 181, 0), x_dir=(1, 0, 0), z_dir=(0, 1, 0))):
        with Locations((219.405209005, 291.746230642)):
            Rectangle(SKETCH_18_W, SKETCH_18_H)
        with Locations(Location((184.299854938, 304.10663833, 0), (0, 0, 270))):
            Circle(SKETCH_18_R, mode=Mode.SUBTRACT)
        with Locations(Location((184.299854938, 278.517078822, 0), (0, 0, 270))):
            Circle(SKETCH_18_R_2, mode=Mode.SUBTRACT)
        with Locations(Location((254.507107947, 278.517078822, 0), (0, 0, 270))):
            Circle(SKETCH_18_R_3, mode=Mode.SUBTRACT)
    extrude(amount=EXTRUDE_16_DEPTH)


solid = part_1.part
